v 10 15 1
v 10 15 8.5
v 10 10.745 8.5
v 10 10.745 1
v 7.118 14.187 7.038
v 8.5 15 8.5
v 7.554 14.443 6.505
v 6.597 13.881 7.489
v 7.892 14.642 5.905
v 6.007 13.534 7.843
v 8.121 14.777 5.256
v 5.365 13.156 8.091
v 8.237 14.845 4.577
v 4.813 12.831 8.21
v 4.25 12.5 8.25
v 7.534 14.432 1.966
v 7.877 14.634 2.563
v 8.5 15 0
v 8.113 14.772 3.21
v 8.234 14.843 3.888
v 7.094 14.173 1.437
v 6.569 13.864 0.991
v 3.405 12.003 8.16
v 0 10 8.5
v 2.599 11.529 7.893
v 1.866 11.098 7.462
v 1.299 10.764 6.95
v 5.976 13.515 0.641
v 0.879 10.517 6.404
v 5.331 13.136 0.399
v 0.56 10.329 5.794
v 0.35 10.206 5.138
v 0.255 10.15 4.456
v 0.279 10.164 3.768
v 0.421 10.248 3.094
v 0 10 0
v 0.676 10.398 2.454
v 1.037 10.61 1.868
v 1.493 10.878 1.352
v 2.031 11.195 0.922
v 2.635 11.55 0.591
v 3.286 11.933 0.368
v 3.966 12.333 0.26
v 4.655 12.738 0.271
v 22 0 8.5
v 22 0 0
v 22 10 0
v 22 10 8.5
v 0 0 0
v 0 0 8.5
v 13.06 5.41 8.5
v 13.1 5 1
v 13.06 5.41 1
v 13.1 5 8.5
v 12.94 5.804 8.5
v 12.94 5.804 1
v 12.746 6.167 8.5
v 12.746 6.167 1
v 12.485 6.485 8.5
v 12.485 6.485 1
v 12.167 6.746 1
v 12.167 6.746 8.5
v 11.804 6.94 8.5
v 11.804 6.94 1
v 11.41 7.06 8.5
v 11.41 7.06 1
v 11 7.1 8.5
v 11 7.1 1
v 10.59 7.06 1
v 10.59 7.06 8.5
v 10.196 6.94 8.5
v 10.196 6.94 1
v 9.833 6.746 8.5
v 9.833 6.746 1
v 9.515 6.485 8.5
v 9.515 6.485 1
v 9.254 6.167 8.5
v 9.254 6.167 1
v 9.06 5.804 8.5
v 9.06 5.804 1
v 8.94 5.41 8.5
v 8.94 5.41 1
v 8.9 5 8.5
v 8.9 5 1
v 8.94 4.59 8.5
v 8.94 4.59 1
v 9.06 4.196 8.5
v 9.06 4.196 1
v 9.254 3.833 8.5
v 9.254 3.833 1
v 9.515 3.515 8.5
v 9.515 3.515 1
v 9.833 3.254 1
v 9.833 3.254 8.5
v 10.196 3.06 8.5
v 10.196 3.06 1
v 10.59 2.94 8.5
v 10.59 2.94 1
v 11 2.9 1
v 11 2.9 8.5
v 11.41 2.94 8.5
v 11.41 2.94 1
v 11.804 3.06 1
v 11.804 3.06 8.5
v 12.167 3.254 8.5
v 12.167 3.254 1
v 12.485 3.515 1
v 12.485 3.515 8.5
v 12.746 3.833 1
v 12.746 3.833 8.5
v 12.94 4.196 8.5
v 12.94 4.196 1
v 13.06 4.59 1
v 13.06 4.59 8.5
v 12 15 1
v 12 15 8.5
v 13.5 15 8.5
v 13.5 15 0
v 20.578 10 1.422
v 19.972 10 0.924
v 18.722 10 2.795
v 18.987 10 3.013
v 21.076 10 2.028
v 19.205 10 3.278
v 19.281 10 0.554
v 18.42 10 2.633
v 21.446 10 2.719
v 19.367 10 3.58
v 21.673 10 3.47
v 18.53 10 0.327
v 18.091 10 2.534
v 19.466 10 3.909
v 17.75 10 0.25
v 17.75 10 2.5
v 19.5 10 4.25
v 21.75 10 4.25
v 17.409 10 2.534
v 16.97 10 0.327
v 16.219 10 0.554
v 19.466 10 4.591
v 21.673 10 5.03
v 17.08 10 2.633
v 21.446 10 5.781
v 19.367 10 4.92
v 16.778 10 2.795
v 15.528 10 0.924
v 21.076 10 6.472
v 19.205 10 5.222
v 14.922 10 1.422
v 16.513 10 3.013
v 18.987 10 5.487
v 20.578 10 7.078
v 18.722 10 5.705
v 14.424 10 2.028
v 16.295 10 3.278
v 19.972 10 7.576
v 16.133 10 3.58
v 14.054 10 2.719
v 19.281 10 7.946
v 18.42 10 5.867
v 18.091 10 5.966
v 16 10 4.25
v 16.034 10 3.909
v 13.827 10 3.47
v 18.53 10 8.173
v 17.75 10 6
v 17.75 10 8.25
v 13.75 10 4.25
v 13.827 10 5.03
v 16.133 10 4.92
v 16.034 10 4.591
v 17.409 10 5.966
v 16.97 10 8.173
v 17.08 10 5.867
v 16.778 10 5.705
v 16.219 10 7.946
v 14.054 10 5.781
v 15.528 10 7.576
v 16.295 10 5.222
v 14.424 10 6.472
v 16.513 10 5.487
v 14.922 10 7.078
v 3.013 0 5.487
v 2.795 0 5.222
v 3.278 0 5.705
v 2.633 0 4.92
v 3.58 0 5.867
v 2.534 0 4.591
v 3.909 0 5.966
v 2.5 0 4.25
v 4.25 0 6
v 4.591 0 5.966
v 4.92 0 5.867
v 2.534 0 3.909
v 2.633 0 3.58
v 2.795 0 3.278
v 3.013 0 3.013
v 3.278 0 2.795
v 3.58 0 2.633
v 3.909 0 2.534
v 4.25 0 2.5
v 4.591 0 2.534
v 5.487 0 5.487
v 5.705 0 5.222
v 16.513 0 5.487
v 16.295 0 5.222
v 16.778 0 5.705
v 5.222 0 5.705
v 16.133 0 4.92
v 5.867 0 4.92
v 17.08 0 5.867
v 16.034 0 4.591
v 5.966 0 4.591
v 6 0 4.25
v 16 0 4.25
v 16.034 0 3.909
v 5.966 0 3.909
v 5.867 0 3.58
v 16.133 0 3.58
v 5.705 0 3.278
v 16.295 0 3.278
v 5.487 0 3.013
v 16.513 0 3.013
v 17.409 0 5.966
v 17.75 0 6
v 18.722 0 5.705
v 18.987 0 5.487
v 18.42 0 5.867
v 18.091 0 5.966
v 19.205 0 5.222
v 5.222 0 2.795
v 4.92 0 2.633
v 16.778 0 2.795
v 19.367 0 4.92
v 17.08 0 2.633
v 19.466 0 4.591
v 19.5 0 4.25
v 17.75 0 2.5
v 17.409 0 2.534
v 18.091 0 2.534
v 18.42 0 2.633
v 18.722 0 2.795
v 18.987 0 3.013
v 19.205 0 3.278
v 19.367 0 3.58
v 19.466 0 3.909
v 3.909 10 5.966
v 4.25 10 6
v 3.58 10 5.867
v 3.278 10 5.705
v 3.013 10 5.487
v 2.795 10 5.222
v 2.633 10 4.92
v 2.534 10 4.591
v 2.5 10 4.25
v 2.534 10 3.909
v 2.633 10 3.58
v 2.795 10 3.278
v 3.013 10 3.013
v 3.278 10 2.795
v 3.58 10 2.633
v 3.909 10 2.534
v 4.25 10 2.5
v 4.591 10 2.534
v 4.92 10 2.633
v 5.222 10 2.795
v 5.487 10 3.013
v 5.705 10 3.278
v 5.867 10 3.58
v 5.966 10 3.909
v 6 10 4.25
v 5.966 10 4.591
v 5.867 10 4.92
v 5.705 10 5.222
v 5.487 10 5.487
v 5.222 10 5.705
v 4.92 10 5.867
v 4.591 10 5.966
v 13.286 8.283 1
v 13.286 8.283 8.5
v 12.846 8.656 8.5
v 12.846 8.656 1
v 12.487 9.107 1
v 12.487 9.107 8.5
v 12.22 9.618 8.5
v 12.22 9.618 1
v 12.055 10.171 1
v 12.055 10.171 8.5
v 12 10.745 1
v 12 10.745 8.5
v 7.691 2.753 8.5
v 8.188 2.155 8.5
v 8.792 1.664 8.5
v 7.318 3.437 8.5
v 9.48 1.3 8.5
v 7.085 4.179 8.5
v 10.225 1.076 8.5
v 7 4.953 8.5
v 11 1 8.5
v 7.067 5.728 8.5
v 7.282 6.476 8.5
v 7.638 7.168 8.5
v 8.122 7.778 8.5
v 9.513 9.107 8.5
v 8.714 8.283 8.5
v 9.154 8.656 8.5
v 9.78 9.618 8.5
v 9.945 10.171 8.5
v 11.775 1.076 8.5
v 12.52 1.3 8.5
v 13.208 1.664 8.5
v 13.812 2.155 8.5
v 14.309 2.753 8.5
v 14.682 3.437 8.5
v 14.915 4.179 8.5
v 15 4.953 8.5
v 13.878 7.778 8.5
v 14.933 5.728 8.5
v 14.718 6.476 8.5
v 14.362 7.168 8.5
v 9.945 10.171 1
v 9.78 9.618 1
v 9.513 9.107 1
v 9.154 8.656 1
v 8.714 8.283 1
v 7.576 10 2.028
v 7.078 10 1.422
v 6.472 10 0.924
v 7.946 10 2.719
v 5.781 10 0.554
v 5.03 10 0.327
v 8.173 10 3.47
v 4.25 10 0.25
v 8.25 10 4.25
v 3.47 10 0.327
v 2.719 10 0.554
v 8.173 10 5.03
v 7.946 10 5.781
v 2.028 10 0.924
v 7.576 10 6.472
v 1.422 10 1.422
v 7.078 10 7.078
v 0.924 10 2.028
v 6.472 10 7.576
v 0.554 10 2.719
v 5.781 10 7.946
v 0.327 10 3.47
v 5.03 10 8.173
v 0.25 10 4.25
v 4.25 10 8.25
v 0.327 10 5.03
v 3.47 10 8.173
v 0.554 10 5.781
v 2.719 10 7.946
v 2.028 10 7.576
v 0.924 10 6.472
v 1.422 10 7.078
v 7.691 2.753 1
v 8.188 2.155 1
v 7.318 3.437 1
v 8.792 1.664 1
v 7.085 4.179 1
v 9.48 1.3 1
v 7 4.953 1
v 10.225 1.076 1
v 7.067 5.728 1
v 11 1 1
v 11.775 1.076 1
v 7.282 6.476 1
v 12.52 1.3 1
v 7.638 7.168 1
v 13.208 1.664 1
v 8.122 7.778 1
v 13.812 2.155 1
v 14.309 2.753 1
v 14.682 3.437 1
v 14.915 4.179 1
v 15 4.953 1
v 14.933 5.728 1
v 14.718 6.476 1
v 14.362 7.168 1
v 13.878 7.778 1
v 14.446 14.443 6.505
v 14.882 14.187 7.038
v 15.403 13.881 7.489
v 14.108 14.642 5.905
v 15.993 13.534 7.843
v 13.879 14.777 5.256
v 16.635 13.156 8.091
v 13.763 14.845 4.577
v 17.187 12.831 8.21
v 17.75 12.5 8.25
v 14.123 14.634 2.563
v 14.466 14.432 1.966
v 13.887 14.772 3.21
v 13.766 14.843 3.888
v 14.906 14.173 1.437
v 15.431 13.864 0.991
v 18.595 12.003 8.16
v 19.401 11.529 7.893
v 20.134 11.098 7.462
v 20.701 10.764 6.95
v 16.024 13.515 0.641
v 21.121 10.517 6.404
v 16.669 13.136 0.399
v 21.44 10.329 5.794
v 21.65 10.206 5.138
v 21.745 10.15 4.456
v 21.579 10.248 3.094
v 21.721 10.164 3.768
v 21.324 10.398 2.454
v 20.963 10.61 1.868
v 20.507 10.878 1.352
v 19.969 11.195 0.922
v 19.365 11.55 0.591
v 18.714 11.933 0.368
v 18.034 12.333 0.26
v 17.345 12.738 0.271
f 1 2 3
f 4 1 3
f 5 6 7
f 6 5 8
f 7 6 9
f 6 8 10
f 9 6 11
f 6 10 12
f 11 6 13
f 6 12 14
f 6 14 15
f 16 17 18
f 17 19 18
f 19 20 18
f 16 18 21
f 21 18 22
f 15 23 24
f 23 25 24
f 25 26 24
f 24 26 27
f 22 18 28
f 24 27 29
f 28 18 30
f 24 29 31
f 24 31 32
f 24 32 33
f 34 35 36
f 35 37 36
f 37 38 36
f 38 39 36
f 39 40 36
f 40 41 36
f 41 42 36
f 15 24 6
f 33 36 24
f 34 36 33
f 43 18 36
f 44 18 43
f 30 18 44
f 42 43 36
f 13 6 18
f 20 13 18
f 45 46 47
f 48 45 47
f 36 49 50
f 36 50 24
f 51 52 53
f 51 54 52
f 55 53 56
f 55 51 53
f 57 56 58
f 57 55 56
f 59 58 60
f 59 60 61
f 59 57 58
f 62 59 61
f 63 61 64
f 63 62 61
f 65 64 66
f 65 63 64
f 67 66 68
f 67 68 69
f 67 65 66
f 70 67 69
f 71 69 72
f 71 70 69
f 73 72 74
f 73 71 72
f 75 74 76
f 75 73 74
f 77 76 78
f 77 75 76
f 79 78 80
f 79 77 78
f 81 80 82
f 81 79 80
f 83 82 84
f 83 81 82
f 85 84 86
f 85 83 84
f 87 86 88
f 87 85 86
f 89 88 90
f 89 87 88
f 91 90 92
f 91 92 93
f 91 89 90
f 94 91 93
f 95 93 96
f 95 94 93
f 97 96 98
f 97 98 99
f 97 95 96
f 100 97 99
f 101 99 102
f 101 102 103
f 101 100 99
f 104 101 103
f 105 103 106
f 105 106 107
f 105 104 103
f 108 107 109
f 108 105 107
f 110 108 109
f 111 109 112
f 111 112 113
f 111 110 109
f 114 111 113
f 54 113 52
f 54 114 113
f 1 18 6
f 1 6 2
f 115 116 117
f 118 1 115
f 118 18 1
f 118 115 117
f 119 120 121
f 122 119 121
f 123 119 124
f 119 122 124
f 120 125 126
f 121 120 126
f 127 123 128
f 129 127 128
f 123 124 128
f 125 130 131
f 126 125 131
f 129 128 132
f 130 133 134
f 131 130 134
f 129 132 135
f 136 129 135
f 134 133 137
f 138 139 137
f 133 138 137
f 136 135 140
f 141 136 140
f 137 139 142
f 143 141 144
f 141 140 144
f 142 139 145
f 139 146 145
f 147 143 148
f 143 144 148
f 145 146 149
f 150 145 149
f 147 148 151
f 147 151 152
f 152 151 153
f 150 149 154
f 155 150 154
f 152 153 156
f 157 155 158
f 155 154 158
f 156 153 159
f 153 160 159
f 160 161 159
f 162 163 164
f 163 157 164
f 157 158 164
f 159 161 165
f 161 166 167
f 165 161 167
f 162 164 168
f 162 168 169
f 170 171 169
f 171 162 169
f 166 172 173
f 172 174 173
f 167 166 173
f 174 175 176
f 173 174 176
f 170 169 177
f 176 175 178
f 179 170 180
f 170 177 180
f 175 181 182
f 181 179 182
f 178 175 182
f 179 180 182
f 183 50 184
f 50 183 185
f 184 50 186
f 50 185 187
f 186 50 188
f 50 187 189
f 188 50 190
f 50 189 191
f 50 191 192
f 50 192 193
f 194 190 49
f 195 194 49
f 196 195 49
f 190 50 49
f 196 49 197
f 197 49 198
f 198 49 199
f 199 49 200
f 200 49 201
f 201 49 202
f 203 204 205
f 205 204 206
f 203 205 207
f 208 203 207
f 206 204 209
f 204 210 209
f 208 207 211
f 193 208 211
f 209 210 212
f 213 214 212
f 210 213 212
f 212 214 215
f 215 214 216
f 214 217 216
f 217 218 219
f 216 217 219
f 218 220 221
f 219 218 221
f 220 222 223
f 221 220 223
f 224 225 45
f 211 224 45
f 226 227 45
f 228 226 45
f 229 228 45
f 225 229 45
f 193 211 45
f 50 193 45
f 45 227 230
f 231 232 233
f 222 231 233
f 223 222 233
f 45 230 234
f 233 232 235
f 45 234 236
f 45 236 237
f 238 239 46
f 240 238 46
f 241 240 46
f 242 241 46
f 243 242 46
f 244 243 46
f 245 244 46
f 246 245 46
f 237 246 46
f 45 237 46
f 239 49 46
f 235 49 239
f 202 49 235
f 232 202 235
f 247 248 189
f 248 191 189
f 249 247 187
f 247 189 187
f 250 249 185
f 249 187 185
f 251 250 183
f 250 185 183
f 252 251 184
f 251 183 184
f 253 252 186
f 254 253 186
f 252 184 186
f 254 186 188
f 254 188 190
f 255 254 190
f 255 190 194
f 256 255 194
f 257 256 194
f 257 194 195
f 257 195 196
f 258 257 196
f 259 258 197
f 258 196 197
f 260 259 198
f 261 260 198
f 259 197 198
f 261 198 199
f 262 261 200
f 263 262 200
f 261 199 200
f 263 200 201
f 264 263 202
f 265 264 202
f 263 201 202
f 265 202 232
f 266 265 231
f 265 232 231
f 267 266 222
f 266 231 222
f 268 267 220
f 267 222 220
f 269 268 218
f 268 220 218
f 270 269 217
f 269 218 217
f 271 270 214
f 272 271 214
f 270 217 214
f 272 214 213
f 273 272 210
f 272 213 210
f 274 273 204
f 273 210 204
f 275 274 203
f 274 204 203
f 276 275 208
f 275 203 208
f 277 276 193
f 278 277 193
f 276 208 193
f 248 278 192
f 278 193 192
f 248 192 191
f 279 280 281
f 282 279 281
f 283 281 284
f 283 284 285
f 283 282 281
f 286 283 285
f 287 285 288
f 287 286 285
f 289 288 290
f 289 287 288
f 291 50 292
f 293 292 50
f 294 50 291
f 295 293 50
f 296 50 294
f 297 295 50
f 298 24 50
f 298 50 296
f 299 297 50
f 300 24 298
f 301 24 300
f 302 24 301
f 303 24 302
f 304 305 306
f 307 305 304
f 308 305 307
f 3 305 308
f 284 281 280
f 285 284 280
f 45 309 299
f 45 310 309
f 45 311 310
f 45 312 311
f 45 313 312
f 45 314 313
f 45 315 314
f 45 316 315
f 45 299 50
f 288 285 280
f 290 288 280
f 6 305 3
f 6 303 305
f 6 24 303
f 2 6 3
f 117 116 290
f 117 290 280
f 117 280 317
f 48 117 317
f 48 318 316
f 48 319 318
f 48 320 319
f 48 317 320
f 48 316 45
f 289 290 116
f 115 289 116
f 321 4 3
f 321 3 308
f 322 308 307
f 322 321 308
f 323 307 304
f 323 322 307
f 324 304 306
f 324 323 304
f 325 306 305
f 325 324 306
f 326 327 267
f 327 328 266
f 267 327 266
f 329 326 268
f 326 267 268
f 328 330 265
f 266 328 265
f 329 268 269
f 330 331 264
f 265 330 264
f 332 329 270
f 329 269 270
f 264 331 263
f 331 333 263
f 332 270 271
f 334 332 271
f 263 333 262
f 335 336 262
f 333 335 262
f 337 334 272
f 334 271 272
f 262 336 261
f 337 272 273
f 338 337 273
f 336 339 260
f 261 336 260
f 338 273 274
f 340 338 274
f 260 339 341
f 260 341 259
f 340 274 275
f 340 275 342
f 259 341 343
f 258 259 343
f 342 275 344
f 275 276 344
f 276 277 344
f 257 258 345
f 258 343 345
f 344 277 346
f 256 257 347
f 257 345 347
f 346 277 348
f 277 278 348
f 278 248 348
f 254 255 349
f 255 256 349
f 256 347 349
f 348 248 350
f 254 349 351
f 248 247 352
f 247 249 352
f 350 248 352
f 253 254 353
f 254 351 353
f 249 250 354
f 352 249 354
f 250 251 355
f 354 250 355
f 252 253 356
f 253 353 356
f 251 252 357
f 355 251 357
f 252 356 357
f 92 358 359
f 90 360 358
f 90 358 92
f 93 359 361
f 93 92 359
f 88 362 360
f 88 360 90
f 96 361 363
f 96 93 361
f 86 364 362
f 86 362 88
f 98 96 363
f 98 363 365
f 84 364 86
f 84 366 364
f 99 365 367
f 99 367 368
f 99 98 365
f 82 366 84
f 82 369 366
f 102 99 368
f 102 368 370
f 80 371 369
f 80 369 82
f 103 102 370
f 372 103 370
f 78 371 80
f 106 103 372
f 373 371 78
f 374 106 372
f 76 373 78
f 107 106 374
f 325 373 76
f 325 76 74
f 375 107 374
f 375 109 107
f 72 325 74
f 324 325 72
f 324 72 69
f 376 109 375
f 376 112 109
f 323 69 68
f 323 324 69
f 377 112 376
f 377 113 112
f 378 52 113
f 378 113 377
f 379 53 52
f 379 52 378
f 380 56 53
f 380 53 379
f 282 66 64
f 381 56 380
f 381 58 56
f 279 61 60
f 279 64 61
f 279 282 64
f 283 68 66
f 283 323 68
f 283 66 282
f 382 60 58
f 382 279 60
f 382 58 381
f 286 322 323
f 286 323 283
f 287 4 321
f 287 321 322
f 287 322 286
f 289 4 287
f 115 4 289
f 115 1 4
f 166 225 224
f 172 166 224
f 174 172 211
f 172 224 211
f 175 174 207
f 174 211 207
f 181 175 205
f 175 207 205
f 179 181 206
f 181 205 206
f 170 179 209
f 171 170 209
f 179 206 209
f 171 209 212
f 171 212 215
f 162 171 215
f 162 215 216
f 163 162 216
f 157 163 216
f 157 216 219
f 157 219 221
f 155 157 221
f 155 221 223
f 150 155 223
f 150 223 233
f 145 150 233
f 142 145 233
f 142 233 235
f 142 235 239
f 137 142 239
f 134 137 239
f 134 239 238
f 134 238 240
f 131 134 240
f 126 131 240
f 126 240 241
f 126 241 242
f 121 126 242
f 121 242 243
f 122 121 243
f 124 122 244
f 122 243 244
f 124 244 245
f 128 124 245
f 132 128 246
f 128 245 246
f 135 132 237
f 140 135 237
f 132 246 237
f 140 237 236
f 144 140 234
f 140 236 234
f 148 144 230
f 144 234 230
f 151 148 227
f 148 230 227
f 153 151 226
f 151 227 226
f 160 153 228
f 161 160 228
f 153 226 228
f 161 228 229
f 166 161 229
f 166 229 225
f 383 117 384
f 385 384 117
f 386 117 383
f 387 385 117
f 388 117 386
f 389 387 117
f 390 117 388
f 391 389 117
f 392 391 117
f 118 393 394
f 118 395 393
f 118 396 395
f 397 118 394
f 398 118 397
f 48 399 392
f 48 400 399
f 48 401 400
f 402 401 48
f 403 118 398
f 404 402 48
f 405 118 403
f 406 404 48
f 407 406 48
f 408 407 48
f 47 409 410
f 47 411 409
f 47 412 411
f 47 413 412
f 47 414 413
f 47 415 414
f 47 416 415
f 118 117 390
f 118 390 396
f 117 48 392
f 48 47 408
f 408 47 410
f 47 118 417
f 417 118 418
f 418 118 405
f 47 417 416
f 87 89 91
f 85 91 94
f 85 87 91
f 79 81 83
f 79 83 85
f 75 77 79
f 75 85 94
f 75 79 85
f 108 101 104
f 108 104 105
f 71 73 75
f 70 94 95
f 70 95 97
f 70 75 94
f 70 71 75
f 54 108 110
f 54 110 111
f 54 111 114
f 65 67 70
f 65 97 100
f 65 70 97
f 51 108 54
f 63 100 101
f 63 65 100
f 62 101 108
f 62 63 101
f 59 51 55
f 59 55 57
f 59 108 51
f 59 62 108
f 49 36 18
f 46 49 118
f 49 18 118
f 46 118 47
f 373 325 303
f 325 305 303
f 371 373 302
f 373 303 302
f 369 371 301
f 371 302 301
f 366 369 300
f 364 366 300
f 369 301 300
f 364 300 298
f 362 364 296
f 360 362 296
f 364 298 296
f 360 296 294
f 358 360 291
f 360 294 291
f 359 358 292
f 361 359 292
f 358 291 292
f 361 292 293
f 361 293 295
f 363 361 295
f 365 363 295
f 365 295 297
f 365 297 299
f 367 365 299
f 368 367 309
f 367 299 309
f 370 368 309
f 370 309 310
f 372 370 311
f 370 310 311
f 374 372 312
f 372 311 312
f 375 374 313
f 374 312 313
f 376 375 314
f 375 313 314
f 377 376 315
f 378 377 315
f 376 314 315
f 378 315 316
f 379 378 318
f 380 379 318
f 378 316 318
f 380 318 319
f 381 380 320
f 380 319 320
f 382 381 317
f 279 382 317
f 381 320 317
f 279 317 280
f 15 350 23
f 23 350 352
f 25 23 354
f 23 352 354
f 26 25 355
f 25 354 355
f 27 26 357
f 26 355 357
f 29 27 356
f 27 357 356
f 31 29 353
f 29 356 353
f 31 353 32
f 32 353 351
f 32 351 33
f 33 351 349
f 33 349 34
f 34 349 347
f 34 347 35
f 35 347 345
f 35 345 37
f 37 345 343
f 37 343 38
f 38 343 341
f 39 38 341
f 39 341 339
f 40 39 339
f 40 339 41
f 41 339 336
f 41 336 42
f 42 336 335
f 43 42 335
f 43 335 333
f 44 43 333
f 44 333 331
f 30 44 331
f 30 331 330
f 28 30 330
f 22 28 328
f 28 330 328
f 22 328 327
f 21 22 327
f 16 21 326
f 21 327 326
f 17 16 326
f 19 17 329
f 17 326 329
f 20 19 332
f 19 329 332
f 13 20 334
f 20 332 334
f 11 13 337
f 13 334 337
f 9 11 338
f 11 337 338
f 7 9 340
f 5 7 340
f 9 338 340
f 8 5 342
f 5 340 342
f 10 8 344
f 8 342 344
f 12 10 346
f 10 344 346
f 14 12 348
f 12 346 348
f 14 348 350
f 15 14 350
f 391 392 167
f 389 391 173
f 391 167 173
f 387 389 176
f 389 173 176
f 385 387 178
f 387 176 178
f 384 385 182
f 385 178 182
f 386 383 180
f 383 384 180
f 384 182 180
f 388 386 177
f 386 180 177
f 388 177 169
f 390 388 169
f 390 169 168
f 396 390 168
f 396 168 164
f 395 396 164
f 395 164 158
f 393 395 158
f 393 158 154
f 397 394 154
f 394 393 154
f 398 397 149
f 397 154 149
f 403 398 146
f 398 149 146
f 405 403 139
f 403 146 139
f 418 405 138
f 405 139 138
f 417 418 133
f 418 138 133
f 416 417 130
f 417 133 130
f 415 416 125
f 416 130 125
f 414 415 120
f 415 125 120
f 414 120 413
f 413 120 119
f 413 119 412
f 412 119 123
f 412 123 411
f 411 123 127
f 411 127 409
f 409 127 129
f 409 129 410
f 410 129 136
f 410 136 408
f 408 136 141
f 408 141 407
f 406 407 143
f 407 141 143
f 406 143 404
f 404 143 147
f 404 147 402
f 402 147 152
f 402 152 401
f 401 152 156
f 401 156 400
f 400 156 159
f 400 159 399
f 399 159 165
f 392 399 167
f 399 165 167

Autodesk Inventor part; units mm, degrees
ref_plane "YZ Plane" through (0, 0, 0) normal (1, 0, 0) x (0, 1, 0)
ref_plane "XZ Plane" through (0, 0, 0) normal (0, 1, 0) x (-1, 0, 0)
ref_plane "XY Plane" through (0, 0, 0) normal (0, 0, 1) x (1, 0, 0)
sketch "Sketch1" plane through (0, 0, 0) normal (0, 0, 1) x (1, 0, 0)
  line L0 (0, 0) -> (22, 0)
  line L1 (22, 0) -> (22, 10)
  line L2 (0, 0) -> (0, 10)
  line L3 (8.5, 15) -> (13.5, 15)
  line L4 (13.5, 15) -> (22, 10)
  line L5 (8.5, 15) -> (0, 10)
  dimension "d0" = 22
  dimension "d1" = 10
  dimension "d2" = 5
  dimension "d3" = 5
extrude "Extrusion1" add sketch "Sketch1" along normal blind 8.5
sketch "Sketch2" plane through (0, 0, 8.5) normal (0, 0, 1) x (1, 0, 0)
  line L0 (0, 0) -> (22, 0) projected
  line L1 (22, 0) -> (22, 10) projected
  line L2 (13.5, 15) -> (8.5, 15) projected
  arc A0 (10, 8.873) -> (12, 8.873) centre (11, 5) ccw
  circle A1 centre (11, 5) radius 2.1
  line L3 (10, 15) -> (10, 8.873)
  line L4 (12, 8.873) -> (12, 15)
  dimension "d6" = 8
  dimension "d7" = 4.2
  dimension "d8" = 5
  dimension "d9" = 11
  dimension "d10" = 2
  dimension "d11" = 1
extrude "Extrusion2" cut sketch "Sketch2" against normal blind 7.5
fillet "Fillet1" radius 3 2 edges at (12, 8.873, 4.75) (10, 8.873, 4.75)
sketch "Sketch3" plane through (8.5, 15, 0) normal (0, 1, 0) x (1, 0, 0)
  line L0 (13.5, 0) -> (5, 0) projected
  line L1 (5, 0) -> (5, -8.5) projected
  line L2 (13.5, -8.5) -> (5, -8.5) projected
  line L3 (13.5, 0) -> (13.5, -8.5) projected
  line L4 (0, 0) -> (-8.5, 0) projected
  line L5 (-8.5, 0) -> (-8.5, -8.5) projected
  line L6 (0, -8.5) -> (-8.5, -8.5) projected
  line L7 (0, 0) -> (0, -8.5) projected
  point P0 (9.25, -4.25)
  point P1 (-4.25, -4.25)
  dimension "d15" = 13.5
  dimension "d16" = 4.25
  dimension "d17" = 4.25
hole "Hole1" at (17.75, 15, 4.25) at (4.25, 15, 4.25) direction (0, -1, 0) diameter 3.5 end through all counterbore diameter 8 counterbore depth 5
properties part number "XCarriageBeltClipRound"
